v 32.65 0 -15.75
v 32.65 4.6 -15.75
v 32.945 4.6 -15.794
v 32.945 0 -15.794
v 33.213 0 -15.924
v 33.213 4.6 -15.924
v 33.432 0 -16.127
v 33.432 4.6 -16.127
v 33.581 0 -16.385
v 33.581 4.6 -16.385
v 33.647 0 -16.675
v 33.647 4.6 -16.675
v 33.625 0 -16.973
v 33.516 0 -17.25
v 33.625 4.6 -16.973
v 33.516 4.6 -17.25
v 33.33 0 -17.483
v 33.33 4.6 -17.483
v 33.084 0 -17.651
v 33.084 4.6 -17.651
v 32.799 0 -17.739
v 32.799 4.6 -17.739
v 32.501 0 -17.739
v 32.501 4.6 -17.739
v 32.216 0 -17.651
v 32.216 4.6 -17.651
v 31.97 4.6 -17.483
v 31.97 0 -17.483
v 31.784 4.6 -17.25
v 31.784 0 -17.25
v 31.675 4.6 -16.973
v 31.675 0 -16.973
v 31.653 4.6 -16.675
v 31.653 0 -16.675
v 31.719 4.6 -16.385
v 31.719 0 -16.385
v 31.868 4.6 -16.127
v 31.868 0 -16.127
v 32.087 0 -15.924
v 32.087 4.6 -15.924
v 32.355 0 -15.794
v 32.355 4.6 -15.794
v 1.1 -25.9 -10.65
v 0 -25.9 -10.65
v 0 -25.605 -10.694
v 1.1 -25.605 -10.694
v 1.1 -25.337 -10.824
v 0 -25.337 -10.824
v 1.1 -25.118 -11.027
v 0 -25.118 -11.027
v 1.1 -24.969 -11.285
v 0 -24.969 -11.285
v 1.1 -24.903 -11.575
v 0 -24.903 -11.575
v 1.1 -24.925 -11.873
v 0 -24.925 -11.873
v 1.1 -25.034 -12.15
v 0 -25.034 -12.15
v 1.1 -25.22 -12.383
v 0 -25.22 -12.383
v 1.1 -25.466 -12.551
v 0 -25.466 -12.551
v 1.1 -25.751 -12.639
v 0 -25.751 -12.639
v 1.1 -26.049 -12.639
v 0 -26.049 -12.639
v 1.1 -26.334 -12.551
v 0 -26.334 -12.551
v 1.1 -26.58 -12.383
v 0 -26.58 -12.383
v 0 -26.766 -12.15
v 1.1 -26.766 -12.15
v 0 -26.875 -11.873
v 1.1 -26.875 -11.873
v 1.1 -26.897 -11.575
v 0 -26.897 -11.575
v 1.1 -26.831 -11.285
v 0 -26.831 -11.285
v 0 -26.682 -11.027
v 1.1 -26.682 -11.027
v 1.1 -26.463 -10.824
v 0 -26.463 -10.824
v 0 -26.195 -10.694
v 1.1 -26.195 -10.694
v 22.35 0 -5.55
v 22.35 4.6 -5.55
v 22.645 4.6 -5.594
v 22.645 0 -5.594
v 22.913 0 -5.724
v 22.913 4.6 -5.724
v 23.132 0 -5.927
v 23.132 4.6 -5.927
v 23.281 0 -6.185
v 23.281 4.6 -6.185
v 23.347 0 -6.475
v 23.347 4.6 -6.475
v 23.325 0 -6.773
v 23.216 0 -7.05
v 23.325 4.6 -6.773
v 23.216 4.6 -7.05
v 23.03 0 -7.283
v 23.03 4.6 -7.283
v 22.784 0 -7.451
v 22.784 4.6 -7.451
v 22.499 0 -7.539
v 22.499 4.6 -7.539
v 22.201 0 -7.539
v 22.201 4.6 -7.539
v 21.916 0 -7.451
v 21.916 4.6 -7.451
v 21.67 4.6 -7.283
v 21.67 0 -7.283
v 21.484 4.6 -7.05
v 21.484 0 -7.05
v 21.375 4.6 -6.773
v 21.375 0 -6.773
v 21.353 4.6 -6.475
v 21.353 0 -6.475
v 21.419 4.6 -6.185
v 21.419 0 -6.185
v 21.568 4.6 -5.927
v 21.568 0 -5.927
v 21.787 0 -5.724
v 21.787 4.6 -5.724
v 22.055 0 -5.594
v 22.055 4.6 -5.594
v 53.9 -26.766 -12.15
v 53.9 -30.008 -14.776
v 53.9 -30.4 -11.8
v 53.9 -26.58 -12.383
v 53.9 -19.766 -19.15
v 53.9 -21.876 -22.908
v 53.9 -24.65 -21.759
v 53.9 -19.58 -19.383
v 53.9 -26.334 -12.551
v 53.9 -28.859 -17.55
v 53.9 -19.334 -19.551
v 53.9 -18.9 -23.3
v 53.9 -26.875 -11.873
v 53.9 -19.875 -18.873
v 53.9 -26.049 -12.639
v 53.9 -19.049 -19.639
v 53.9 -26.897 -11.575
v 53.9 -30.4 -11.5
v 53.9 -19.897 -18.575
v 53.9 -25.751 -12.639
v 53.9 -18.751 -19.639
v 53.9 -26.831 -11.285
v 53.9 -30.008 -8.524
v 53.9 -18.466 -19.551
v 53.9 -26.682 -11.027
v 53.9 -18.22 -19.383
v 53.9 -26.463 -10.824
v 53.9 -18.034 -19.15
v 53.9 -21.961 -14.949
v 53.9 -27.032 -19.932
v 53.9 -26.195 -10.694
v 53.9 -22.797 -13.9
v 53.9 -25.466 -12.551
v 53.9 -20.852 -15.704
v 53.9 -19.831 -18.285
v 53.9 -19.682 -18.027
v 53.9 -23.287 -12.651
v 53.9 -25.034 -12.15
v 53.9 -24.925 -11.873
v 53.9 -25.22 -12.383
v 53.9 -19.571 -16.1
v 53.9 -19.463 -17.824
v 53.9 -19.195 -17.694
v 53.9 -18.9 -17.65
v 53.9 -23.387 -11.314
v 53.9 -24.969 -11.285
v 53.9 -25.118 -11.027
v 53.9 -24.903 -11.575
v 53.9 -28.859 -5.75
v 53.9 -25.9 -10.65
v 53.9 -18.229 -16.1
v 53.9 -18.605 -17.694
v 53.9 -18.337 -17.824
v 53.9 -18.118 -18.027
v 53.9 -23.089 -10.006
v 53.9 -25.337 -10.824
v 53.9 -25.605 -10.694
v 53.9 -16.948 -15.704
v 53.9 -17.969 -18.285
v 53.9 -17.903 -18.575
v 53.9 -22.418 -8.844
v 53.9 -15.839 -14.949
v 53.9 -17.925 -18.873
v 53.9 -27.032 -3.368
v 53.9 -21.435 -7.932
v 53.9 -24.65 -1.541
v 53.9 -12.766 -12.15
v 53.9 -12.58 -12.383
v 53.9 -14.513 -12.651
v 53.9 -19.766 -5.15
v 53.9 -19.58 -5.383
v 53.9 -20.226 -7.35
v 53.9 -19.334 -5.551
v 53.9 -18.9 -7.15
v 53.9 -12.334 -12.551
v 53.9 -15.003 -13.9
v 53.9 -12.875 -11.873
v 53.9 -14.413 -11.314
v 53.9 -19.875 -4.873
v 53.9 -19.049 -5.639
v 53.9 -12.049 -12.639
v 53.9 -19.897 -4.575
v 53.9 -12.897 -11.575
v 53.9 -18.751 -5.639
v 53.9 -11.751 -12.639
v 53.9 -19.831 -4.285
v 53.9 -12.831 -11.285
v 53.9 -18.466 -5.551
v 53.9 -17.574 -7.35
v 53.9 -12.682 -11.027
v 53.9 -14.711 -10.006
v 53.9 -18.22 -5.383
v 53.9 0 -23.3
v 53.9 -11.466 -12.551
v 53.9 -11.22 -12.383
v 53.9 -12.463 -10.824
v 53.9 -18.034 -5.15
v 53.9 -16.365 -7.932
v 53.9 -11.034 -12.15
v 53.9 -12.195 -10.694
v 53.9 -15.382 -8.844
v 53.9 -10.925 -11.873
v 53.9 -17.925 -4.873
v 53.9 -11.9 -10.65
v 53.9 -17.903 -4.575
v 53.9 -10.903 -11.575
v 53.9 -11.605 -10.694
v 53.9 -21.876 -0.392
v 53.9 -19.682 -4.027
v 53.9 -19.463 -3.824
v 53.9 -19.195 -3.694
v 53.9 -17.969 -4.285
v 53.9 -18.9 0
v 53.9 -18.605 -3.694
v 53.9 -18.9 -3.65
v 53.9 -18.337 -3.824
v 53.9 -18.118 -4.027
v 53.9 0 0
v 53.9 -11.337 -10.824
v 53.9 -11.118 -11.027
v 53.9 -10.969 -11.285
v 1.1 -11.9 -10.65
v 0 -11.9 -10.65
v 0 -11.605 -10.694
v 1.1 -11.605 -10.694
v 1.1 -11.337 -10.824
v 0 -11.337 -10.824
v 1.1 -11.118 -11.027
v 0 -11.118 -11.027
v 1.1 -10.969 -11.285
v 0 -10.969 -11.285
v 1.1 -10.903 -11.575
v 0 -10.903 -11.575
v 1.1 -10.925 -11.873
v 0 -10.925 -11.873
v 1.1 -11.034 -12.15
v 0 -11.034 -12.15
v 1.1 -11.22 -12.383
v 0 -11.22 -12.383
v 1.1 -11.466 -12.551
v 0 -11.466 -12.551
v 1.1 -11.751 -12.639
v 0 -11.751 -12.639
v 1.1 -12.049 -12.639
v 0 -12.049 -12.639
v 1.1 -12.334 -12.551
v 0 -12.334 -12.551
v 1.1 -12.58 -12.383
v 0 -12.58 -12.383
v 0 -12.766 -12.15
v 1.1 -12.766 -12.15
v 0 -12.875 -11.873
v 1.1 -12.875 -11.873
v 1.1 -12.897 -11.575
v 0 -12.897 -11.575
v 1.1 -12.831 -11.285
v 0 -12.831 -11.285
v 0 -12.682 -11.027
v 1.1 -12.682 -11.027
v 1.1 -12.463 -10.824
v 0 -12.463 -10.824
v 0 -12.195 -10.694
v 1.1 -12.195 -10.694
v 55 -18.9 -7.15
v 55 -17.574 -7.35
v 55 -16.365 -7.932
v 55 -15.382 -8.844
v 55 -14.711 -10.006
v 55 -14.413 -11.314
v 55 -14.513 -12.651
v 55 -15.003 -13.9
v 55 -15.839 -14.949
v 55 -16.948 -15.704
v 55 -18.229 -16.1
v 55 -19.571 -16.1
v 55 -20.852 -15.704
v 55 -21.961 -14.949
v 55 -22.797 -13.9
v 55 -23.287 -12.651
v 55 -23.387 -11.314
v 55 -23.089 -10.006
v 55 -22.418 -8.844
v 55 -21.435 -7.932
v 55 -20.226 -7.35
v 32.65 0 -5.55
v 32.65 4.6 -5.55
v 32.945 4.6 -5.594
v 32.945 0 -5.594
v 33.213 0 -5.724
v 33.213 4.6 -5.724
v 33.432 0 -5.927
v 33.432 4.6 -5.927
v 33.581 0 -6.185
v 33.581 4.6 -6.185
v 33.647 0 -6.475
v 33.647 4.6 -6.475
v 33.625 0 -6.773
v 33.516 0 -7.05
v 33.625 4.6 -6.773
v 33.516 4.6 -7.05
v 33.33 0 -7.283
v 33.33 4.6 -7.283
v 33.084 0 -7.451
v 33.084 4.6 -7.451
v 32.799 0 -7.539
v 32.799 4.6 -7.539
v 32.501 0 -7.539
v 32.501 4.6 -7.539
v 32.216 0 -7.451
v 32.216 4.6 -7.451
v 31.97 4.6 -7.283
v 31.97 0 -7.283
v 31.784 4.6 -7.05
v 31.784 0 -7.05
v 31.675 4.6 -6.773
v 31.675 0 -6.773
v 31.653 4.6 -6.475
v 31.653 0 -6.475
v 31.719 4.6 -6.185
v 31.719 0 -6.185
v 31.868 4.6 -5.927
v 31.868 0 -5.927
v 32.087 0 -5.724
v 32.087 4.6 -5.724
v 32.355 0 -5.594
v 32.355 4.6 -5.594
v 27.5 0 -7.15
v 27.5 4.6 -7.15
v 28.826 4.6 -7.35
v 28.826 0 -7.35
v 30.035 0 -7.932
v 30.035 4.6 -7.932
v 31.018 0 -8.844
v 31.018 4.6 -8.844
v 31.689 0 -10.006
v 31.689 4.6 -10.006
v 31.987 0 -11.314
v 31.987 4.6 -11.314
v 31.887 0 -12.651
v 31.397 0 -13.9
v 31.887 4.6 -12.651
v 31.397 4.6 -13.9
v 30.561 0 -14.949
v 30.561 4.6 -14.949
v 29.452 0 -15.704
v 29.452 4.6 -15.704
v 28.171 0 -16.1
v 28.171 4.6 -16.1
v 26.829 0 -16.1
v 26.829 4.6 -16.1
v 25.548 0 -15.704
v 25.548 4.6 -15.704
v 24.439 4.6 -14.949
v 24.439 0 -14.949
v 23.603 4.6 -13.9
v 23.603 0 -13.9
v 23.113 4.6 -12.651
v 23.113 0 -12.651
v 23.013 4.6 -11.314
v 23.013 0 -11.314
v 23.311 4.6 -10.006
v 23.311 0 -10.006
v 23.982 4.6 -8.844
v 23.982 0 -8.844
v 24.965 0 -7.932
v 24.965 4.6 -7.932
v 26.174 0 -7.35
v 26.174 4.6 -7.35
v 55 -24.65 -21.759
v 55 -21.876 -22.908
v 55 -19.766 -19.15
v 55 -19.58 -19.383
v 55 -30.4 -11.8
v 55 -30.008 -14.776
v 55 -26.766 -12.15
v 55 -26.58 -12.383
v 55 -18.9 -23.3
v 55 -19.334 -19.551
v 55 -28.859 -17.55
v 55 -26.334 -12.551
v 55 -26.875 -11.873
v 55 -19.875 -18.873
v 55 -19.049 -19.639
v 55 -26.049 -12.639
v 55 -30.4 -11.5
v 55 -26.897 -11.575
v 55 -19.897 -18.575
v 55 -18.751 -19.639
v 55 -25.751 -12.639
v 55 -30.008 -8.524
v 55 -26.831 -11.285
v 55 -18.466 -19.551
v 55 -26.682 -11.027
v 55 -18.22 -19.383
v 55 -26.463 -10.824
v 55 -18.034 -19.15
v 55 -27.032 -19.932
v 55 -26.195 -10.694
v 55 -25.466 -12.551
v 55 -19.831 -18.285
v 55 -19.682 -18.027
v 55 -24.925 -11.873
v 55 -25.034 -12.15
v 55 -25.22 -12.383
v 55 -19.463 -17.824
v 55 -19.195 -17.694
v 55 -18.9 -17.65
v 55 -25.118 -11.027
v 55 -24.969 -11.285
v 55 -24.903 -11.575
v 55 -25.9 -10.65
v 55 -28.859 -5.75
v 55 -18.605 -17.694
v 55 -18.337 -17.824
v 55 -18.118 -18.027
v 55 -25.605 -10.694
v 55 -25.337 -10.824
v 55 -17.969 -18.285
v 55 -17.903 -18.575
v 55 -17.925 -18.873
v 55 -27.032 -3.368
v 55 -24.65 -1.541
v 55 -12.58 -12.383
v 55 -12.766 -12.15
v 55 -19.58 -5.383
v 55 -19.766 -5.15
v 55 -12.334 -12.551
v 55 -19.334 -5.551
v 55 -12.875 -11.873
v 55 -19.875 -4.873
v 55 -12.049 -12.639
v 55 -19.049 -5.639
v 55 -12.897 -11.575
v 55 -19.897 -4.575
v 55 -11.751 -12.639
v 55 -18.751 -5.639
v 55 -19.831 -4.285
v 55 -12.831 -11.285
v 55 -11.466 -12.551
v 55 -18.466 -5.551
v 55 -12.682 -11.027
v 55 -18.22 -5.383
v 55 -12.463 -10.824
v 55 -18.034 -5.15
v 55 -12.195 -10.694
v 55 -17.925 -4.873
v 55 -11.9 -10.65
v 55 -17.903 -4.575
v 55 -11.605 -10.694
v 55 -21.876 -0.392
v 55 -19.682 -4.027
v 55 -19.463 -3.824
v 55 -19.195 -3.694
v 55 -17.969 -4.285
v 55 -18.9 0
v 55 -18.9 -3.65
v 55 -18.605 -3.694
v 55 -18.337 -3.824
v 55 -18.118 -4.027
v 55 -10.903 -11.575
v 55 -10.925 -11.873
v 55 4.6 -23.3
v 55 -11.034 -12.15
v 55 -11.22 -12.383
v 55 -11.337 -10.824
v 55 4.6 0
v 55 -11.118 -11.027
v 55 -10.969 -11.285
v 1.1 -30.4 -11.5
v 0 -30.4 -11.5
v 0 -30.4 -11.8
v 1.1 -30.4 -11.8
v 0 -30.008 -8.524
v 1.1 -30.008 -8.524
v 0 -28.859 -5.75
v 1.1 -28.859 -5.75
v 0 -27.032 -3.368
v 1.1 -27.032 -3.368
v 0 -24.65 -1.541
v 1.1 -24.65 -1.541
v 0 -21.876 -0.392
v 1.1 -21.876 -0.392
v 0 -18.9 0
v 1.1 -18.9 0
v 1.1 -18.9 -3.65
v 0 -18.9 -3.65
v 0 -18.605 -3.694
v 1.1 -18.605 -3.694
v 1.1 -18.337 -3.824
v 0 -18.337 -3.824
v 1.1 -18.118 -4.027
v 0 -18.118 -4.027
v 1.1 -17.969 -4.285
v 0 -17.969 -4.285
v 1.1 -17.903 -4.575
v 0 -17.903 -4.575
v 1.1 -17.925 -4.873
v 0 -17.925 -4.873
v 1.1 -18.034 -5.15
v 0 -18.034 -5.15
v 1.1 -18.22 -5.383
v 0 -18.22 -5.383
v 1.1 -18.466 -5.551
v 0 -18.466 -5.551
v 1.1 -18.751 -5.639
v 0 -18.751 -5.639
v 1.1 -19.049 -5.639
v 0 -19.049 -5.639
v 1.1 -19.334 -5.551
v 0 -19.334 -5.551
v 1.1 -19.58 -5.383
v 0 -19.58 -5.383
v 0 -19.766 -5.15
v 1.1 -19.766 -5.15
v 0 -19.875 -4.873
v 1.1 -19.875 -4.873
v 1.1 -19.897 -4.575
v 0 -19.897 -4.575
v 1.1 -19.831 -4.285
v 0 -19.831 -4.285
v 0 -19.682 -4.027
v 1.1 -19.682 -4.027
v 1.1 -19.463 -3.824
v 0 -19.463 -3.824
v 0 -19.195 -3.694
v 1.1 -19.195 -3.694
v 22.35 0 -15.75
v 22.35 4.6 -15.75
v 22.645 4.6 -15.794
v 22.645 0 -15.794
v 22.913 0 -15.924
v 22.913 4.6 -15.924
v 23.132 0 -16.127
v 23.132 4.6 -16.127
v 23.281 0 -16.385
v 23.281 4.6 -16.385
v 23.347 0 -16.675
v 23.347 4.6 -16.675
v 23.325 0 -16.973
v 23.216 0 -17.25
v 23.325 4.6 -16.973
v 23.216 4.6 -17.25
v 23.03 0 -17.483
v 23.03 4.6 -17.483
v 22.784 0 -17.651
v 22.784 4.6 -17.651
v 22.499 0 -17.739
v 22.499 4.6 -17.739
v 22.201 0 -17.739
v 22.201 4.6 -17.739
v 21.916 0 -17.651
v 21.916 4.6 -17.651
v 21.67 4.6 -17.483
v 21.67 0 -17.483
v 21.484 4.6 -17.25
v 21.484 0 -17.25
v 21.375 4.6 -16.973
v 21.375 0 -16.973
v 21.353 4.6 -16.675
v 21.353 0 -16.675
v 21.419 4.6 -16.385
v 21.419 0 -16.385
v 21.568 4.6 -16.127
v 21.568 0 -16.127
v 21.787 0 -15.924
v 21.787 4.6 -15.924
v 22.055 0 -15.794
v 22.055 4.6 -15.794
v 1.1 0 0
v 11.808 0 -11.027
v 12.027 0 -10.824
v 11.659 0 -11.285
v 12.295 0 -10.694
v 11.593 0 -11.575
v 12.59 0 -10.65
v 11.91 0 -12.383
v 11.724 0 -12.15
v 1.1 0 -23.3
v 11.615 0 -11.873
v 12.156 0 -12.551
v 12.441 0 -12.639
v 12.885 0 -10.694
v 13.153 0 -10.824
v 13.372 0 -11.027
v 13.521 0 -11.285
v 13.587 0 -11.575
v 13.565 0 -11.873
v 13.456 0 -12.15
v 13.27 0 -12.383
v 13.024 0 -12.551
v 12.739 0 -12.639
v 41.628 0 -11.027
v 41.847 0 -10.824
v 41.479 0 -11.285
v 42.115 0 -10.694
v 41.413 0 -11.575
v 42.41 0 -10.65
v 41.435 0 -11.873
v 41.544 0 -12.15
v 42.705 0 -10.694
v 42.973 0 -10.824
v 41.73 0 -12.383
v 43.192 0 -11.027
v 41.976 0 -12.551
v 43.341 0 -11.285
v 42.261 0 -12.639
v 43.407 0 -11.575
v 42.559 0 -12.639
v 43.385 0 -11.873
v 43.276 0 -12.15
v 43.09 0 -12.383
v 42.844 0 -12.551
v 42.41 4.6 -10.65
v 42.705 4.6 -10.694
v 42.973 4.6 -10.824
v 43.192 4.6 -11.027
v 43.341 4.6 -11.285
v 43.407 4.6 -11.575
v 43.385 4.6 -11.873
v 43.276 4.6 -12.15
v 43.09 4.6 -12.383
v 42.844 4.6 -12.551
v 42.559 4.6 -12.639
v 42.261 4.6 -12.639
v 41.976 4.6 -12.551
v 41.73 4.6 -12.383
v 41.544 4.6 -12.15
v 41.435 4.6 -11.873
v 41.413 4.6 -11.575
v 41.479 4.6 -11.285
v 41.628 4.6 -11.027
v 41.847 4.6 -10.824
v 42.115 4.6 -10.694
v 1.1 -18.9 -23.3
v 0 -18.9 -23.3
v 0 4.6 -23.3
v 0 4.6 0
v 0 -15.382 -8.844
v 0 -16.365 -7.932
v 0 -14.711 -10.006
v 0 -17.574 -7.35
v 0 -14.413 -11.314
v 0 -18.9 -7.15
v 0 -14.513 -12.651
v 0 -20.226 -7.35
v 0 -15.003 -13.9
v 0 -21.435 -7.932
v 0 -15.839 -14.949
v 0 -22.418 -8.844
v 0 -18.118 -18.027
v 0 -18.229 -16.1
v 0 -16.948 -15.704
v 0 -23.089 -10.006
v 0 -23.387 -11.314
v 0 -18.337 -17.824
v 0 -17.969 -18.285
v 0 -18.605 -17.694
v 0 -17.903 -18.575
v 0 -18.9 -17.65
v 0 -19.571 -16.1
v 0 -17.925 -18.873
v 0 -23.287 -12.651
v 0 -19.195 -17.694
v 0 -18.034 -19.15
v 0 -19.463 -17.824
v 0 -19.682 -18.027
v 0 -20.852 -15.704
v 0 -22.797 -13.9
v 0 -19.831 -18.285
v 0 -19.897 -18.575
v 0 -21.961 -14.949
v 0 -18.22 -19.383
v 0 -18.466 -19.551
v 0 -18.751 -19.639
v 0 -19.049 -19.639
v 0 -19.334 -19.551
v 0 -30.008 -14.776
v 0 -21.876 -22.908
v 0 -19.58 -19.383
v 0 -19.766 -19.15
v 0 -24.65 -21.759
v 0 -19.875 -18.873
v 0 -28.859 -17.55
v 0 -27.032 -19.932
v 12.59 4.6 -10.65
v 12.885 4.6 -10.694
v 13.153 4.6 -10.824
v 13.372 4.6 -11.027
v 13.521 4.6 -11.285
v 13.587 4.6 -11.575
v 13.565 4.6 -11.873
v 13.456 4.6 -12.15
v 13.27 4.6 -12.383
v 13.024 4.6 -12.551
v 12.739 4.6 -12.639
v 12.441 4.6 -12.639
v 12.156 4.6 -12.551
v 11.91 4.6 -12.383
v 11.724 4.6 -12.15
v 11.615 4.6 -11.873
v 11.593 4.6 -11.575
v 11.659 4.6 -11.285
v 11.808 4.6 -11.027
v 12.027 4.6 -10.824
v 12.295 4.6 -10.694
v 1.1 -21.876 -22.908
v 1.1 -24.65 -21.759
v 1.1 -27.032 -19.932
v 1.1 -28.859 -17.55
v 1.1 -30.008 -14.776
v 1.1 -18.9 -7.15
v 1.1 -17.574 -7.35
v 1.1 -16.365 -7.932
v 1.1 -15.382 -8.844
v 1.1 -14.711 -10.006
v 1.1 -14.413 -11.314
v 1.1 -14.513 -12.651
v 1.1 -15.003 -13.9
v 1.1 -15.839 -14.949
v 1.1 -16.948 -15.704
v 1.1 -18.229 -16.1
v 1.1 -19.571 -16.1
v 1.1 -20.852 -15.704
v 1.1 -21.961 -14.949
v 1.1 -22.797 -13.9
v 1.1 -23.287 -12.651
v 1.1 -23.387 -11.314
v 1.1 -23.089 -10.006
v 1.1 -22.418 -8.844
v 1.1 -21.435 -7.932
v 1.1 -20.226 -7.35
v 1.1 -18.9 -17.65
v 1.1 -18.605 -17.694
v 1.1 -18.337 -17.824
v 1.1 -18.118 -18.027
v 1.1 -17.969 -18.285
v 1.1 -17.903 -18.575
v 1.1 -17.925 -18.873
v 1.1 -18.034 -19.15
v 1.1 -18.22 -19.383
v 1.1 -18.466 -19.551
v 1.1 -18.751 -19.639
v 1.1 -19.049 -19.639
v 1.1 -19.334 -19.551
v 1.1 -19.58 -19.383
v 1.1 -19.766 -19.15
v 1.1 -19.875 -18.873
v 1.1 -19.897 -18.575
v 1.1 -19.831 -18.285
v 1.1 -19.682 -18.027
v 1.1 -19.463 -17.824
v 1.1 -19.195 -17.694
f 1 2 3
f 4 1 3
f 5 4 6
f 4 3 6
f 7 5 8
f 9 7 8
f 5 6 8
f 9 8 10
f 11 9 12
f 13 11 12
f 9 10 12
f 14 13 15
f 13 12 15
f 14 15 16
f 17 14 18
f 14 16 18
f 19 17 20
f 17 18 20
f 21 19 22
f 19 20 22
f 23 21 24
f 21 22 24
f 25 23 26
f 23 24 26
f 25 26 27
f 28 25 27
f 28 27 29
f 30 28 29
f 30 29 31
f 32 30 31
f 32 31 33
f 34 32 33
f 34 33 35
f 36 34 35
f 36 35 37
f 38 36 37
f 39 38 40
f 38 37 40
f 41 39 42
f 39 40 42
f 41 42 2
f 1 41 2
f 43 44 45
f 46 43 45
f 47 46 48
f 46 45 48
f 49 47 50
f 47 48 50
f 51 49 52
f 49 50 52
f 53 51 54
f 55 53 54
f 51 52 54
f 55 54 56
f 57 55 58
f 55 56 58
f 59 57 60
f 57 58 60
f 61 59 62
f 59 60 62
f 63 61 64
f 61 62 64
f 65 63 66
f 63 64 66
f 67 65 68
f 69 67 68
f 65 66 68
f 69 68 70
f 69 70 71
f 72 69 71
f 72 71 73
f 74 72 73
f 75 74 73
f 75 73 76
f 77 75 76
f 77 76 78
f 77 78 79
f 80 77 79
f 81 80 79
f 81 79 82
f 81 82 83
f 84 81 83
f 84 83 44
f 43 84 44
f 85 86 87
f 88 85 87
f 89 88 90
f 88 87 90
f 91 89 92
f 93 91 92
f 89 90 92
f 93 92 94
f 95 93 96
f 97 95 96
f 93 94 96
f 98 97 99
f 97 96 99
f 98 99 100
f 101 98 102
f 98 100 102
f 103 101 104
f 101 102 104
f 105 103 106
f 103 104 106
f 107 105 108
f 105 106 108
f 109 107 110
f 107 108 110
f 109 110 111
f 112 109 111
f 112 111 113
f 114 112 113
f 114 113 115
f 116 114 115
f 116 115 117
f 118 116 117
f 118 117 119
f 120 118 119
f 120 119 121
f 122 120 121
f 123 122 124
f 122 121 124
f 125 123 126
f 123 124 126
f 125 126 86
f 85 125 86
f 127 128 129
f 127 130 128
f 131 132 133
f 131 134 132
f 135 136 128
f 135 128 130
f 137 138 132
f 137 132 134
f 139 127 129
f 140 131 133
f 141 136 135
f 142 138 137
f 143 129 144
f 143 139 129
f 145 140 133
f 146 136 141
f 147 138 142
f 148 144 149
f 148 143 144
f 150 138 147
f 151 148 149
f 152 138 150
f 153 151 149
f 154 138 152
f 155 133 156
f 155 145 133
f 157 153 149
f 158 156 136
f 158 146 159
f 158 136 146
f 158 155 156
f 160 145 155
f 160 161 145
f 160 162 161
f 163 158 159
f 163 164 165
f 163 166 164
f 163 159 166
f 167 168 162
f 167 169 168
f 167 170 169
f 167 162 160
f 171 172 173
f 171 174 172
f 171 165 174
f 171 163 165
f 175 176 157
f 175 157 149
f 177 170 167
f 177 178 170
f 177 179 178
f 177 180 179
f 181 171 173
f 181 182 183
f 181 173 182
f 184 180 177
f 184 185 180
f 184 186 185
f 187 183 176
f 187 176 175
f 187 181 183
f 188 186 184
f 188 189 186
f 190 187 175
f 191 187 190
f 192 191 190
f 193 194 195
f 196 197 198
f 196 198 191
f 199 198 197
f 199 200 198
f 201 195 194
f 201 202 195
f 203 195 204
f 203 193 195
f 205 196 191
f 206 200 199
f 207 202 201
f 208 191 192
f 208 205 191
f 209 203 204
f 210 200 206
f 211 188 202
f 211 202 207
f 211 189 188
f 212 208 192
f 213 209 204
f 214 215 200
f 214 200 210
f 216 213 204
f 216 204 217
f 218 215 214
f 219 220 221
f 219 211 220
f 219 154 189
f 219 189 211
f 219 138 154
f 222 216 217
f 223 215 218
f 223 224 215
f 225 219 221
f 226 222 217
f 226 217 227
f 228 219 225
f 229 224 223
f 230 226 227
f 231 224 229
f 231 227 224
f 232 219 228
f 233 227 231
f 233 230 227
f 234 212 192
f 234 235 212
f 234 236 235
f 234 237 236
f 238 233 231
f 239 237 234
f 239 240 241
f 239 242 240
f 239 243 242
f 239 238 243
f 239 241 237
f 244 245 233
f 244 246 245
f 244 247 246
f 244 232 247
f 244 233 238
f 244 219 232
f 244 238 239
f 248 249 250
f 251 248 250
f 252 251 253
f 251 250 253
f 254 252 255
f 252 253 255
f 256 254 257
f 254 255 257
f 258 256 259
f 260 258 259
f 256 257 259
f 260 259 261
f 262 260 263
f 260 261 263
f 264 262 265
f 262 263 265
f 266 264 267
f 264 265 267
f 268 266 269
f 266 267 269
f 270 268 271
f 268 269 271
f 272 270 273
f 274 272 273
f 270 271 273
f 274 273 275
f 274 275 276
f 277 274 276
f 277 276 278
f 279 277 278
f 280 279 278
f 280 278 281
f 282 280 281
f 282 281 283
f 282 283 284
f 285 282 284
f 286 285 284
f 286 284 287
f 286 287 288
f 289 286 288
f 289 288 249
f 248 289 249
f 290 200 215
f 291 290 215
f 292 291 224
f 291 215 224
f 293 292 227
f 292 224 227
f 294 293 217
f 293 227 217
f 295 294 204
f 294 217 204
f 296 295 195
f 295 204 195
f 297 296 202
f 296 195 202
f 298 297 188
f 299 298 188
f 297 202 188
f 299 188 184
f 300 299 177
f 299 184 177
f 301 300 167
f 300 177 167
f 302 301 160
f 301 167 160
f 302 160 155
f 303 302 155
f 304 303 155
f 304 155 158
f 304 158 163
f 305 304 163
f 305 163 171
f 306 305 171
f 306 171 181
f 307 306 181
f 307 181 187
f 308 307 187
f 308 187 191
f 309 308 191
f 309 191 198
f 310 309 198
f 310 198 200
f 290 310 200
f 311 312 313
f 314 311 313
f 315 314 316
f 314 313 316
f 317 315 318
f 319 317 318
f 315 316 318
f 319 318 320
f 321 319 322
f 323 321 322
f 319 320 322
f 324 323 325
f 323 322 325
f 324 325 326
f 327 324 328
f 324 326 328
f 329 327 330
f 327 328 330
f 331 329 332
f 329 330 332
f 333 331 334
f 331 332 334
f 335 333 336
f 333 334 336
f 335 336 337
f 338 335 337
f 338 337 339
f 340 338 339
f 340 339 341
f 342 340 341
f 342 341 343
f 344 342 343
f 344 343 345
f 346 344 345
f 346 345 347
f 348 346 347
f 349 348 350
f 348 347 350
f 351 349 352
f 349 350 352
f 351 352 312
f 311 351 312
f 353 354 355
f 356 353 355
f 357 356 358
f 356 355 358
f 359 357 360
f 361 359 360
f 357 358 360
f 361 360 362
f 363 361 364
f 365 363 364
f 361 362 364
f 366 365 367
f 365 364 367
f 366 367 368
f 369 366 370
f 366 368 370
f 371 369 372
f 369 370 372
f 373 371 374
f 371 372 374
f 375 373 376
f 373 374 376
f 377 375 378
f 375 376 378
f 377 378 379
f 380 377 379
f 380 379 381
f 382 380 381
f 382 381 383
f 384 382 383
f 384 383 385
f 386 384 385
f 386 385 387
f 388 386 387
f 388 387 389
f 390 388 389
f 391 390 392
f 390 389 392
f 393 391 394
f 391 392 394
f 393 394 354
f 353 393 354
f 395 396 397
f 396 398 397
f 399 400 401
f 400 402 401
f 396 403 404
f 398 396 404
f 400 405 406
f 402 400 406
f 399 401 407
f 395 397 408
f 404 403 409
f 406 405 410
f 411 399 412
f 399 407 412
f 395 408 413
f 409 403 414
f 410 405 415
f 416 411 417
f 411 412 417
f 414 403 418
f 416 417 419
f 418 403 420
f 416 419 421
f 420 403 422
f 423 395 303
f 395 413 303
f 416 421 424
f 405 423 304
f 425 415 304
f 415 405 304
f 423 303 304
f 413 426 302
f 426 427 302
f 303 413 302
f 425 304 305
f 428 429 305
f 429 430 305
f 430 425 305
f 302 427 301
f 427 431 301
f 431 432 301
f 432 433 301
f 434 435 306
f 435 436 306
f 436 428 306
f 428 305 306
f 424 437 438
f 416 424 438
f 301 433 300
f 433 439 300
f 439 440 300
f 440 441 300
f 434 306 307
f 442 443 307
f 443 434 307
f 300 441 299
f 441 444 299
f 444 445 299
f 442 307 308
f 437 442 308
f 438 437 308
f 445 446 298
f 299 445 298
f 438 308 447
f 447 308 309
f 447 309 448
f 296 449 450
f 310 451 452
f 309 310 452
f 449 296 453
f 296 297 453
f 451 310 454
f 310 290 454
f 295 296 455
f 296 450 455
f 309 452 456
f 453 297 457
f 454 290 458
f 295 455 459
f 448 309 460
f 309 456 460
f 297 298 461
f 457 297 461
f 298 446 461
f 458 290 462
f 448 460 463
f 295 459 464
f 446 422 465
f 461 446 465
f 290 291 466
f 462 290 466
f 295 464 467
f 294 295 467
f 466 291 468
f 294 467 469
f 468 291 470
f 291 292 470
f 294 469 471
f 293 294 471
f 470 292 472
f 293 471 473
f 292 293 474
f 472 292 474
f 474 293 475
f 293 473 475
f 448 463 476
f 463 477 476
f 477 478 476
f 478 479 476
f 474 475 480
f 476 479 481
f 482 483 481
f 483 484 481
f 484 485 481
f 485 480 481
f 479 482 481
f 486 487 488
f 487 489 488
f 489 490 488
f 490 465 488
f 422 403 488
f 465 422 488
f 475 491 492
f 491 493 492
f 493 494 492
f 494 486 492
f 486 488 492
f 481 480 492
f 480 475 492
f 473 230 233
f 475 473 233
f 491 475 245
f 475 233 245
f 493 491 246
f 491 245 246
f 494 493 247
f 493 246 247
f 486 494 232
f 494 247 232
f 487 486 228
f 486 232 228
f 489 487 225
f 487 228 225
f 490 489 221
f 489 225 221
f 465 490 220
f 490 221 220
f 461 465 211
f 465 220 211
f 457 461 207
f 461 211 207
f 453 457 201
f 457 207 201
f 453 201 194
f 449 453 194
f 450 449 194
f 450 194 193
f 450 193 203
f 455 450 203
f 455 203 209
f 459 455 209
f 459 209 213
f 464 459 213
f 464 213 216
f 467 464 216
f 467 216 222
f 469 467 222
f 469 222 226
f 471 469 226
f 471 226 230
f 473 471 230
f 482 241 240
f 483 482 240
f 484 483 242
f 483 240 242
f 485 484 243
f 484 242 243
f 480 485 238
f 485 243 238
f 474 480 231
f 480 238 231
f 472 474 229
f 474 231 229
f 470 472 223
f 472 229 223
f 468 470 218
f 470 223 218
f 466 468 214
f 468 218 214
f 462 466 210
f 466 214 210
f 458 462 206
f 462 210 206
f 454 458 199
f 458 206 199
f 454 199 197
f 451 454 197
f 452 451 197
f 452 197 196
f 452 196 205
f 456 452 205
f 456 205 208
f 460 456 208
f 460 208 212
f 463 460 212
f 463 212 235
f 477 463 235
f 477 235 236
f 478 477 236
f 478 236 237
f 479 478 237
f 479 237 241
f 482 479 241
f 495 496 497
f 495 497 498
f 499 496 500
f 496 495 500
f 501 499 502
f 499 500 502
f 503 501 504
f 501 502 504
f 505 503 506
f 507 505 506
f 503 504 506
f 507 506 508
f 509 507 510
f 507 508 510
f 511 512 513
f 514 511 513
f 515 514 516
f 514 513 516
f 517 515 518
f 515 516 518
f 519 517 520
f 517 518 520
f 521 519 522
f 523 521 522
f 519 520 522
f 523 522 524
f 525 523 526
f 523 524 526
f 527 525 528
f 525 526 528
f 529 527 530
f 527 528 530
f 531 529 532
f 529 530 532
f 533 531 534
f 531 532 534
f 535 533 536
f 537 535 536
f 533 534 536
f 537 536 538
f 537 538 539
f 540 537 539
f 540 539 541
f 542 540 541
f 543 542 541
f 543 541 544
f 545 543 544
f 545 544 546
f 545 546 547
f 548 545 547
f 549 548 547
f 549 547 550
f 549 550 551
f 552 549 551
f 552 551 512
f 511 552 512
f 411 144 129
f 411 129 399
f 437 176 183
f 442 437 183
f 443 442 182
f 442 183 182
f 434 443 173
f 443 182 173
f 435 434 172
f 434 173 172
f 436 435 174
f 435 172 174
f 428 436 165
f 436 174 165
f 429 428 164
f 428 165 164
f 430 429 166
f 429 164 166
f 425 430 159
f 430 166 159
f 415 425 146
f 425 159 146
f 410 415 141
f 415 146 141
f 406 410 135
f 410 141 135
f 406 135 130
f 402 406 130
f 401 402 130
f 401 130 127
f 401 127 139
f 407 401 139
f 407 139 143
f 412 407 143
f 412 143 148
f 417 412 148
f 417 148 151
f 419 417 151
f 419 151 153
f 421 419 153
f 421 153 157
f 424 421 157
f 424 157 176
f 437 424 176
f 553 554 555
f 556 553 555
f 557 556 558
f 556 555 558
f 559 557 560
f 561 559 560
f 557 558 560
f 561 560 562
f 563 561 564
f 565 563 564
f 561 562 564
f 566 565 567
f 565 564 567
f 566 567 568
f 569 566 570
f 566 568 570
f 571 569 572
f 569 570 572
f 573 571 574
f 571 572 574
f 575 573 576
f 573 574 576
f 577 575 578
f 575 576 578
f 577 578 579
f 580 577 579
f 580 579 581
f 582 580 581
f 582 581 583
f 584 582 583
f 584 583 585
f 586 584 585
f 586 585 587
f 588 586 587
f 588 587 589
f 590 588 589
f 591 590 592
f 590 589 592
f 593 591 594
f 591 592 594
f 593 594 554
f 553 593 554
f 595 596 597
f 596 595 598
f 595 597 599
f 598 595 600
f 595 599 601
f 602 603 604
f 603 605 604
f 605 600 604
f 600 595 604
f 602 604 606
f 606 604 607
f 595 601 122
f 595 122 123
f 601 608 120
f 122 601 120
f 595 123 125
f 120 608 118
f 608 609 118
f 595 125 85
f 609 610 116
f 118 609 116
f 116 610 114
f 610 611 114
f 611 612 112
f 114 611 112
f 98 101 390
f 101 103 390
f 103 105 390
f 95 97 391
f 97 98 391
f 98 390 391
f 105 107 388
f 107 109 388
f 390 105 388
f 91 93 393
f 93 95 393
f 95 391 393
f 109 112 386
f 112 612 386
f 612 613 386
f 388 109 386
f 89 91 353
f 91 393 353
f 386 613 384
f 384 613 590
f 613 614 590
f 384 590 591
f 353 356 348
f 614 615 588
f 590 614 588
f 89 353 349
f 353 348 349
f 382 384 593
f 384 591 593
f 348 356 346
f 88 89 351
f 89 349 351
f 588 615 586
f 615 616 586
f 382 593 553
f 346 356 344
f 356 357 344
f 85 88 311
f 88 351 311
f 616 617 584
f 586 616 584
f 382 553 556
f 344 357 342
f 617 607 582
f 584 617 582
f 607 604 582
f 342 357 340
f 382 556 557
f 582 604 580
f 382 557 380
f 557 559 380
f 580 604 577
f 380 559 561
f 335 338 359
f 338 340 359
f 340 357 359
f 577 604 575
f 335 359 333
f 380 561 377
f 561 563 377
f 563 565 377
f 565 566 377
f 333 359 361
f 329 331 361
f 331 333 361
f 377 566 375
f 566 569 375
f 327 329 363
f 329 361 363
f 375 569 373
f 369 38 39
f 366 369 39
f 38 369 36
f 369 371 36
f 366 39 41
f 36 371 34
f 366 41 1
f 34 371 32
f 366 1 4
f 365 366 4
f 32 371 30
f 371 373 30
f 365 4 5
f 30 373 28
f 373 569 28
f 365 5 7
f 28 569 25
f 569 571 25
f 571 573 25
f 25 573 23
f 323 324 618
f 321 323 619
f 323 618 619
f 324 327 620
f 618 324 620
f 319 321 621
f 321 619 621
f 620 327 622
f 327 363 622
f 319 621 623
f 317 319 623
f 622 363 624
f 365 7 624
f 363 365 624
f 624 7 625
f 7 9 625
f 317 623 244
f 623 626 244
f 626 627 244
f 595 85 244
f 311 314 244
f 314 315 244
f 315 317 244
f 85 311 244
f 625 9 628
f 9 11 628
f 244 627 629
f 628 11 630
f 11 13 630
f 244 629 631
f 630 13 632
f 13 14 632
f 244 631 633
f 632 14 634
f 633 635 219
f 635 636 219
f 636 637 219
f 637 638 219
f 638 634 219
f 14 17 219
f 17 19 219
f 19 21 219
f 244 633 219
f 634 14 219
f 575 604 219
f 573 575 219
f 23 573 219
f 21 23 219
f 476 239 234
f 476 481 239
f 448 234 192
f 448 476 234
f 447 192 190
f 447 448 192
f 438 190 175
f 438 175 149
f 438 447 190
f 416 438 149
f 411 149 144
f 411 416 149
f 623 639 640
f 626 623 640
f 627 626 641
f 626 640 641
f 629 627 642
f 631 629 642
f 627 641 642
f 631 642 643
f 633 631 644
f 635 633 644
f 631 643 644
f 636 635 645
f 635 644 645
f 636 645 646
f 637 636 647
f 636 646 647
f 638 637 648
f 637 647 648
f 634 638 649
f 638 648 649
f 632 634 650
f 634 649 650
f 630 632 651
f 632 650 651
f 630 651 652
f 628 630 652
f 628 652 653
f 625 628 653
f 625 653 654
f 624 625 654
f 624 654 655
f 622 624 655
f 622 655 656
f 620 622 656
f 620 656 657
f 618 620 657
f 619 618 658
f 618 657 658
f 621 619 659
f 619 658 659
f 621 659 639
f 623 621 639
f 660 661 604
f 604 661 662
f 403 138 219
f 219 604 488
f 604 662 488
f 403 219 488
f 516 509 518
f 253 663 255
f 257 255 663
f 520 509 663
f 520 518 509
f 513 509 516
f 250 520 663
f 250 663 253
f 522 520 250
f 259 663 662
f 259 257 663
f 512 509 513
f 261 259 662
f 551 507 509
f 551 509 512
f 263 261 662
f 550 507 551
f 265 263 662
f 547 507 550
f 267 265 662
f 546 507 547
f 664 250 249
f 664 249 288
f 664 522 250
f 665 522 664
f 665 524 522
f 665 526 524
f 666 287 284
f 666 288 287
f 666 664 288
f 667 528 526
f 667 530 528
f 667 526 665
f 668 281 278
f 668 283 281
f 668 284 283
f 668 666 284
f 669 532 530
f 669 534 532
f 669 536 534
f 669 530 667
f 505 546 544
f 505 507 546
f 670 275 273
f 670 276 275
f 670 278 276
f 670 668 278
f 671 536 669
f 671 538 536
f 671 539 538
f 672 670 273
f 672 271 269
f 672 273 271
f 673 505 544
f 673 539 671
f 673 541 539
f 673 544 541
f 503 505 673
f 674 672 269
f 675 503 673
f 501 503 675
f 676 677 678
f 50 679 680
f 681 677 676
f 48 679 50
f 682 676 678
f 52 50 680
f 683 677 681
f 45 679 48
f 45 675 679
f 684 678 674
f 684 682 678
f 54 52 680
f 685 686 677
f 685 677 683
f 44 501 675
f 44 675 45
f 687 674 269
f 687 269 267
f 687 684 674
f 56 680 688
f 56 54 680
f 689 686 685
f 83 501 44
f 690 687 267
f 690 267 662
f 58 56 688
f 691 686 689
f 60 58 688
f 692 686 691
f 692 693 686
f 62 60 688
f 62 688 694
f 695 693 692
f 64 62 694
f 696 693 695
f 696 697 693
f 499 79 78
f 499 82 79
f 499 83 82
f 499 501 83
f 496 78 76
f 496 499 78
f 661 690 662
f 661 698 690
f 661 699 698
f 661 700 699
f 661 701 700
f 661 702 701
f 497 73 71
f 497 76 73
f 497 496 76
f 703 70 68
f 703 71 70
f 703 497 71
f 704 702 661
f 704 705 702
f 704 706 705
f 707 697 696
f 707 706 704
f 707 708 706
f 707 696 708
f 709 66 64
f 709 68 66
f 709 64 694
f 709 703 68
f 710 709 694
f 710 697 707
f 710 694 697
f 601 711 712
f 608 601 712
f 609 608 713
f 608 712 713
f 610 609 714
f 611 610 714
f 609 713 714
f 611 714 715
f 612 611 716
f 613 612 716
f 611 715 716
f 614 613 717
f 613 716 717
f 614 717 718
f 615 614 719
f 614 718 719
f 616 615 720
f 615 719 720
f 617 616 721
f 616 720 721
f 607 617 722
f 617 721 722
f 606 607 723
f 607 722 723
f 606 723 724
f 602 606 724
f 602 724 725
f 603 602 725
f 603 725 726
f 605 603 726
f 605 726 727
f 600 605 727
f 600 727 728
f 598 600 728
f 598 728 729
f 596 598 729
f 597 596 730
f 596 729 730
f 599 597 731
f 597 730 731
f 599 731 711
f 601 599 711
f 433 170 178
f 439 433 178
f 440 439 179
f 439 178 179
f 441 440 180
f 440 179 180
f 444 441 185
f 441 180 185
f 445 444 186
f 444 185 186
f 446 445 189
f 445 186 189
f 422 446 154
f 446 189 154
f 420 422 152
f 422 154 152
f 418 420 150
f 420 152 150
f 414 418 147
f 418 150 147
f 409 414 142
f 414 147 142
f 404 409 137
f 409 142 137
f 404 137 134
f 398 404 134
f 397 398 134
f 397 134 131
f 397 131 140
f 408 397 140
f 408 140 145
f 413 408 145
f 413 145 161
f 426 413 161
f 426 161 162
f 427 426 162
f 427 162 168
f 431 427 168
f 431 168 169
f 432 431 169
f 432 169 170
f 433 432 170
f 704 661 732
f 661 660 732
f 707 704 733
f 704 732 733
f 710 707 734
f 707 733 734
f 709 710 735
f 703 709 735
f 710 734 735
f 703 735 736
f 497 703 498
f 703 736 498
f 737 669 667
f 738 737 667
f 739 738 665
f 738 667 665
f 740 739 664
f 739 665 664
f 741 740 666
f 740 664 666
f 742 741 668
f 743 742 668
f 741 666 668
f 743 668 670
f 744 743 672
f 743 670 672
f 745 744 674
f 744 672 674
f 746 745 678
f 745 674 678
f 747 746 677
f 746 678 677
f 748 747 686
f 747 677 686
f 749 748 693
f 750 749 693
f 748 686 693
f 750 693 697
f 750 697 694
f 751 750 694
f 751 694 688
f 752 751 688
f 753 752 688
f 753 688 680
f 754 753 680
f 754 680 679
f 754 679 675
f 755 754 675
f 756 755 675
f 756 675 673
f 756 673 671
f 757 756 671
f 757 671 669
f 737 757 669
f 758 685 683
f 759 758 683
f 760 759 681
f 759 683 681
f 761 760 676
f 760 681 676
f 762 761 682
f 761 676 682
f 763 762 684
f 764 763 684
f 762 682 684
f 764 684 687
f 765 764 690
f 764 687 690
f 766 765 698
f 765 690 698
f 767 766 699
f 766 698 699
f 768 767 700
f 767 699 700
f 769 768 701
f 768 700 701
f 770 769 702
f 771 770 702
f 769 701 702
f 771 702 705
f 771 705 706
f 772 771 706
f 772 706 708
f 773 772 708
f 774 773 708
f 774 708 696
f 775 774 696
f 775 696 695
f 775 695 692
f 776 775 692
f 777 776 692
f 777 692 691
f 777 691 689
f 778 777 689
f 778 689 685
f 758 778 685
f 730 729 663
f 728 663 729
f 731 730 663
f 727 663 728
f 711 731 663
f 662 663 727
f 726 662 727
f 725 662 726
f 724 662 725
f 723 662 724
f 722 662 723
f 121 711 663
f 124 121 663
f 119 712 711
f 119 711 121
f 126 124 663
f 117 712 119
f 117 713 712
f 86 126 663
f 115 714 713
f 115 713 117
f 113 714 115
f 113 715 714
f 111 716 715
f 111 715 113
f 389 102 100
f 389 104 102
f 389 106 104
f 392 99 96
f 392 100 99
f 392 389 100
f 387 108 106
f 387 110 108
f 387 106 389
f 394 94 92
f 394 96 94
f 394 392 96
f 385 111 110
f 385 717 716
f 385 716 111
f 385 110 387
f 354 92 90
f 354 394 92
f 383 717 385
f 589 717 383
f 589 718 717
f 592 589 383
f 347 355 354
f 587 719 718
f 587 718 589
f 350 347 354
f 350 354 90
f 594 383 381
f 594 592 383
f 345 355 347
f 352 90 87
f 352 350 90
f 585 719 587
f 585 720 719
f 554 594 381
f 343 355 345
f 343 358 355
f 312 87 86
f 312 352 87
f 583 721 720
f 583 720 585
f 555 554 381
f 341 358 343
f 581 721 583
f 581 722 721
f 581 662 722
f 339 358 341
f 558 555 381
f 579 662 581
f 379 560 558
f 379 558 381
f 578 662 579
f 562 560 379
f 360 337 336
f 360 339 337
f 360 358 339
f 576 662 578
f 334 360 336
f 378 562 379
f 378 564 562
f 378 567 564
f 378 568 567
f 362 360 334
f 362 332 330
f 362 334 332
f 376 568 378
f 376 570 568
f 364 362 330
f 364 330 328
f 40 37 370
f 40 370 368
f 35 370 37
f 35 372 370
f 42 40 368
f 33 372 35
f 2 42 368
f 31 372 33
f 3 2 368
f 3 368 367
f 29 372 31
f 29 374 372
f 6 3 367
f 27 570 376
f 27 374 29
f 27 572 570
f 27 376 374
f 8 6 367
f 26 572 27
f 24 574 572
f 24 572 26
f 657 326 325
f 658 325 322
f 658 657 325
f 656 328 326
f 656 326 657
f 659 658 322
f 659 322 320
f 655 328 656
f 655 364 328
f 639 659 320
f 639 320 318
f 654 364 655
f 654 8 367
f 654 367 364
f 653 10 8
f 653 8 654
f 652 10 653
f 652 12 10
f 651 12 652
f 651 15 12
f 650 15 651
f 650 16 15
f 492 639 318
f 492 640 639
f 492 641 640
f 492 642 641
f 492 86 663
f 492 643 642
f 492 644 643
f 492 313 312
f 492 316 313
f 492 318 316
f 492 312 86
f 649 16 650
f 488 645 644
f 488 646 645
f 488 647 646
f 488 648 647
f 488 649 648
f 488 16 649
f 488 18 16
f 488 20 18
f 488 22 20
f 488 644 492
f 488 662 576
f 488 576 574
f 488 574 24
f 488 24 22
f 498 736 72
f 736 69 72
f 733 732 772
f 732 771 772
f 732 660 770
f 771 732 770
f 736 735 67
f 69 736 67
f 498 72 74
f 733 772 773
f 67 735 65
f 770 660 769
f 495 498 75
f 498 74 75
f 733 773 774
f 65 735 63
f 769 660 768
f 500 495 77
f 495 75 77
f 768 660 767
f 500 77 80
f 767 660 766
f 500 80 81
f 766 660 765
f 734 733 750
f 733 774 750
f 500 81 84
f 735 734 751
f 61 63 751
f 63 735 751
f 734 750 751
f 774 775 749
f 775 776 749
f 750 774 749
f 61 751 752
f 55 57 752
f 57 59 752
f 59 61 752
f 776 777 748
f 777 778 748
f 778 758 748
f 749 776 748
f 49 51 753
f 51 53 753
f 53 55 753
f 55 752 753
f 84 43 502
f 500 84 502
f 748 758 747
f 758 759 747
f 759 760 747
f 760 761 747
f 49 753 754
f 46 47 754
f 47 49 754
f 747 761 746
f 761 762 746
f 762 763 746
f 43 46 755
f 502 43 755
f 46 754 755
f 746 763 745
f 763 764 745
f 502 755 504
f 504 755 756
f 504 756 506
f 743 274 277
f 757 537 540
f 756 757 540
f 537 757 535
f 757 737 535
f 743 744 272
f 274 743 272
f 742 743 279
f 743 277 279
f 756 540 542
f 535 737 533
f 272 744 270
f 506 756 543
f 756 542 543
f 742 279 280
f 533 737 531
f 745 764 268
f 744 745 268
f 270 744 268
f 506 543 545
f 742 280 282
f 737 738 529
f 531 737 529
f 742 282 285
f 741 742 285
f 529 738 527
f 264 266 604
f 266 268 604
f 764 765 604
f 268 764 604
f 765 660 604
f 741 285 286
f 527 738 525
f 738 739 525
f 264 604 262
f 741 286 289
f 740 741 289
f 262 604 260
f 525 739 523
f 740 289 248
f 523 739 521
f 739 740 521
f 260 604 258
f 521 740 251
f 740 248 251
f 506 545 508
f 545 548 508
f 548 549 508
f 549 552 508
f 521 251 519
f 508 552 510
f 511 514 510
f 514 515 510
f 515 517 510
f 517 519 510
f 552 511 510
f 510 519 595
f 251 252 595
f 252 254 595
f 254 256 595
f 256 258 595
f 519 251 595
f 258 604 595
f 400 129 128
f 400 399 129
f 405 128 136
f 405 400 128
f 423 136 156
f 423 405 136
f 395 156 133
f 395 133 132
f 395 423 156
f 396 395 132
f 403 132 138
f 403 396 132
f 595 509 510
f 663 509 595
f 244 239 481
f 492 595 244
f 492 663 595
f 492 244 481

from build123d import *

# Parameters (mm, degrees)
SKETCH1_W                = 55
SKETCH1_H                = 23.3
MOUNTPLATE_DEPTH         = 4.6
SKETCH3_R                = 4.5
AXLEHOLE_MOUNT_DEPTH     = 4.6
SKETCH2_R                = 1
MOUNTHOLES_DEPTH         = 4.6
SKETCH4_W                = 1.1
SKETCH4_H                = 23.3
SERVOLEGS_DEPTH          = 30.4
CENTERHOLES_REACH        = 69.023
SKETCH5_R                = 4.5
ROTATOR_MOUNTHOLES_REACH = 69.023
SKETCH6_R                = 1
FILLET1_R                = 11.5
FILLET2_R                = 11.5
FILLET3_R                = 11.5
FILLET4_R                = 11.5


with BuildPart() as part:
    # Sketch1 → MountPlate (new body)
    with BuildSketch(Plane(origin=(0, 0, 0), x_dir=(1, 0, 0), z_dir=(0, 1, 0))):
        with Locations((27.5, 11.65)):
            Rectangle(SKETCH1_W, SKETCH1_H)
    extrude(amount=MOUNTPLATE_DEPTH)

    # Sketch3 → AxleHole-Mount (cut)
    with BuildSketch(Plane(origin=(0, 4.6, 0), x_dir=(1, 0, 0), z_dir=(0, 1, 0))):
        with Locations(Location((27.5, 11.65, 0), (0, 0, 270))):
            Circle(SKETCH3_R)
    extrude(amount=-AXLEHOLE_MOUNT_DEPTH, mode=Mode.SUBTRACT)

    # Sketch2 → MountHoles (cut)
    with BuildSketch(Plane(origin=(0, 4.6, 0), x_dir=(1, 0, 0), z_dir=(0, 1, 0))):
        with Locations(Location((22.35, 16.75, 0), (0, 0, 270))):
            Circle(SKETCH2_R)
        with Locations(Location((12.59, 11.65, 0), (0, 0, 270))):
            Circle(SKETCH2_R)
        with Locations(Location((32.65, 16.75, 0), (0, 0, 270))):
            Circle(SKETCH2_R)
        with Locations(Location((22.35, 6.55, 0), (0, 0, 270))):
            Circle(SKETCH2_R)
        with Locations(Location((42.41, 11.65, 0), (0, 0, 270))):
            Circle(SKETCH2_R)
        with Locations(Location((32.65, 6.55, 0), (0, 0, 270))):
            Circle(SKETCH2_R)
    extrude(amount=-MOUNTHOLES_DEPTH, mode=Mode.SUBTRACT)

    # Sketch4 → ServoLegs (add)
    with BuildSketch(Plane.XZ):
        with Locations((54.45, -11.65)):
            Rectangle(SKETCH4_W, SKETCH4_H)
        with Locations((0.55, -11.65)):
            Rectangle(SKETCH4_W, SKETCH4_H)
    extrude(amount=SERVOLEGS_DEPTH)

    # CenterHoles: up to this face of the body (flat: up to its plane)
    centerholes_end = Plane(part.part.faces().sort_by_distance((55, -12.9, -11.65))[0])
    # Sketch5 → CenterHoles (cut, up to the picked face)
    with BuildSketch(Plane.ZY, mode=Mode.PRIVATE) as centerholes_sk1:
        with Locations((-11.65, -18.9)):
            Circle(SKETCH5_R)
    centerholes_tool1 = split(extrude(centerholes_sk1.sketch, amount=-CENTERHOLES_REACH, mode=Mode.PRIVATE), bisect_by=centerholes_end, keep=Keep.BOTH, mode=Mode.PRIVATE)
    add(centerholes_tool1.solids().sort_by(Axis((0, -18.9, -11.65), (1, 0, 0)))[0], mode=Mode.SUBTRACT)

    # Rotator-MountHoles: up to this face of the body (flat: up to its plane)
    rotator_mountholes_end = Plane(part.part.faces().sort_by_distance((55, -12.392336394, -11.65))[0])
    # Sketch6 → Rotator-MountHoles (cut, up to the picked face)
    with BuildSketch(Plane.ZY, mode=Mode.PRIVATE) as rotator_mountholes_sk1:
        with Locations((-11.65, -25.9)):
            Circle(SKETCH6_R)
    rotator_mountholes_tool1 = split(extrude(rotator_mountholes_sk1.sketch, amount=-ROTATOR_MOUNTHOLES_REACH, mode=Mode.PRIVATE), bisect_by=rotator_mountholes_end, keep=Keep.BOTH, mode=Mode.PRIVATE)
    # Sketch6 → Rotator-MountHoles (cut, up to the picked face)
    with BuildSketch(Plane.ZY, mode=Mode.PRIVATE) as rotator_mountholes_sk2:
        with Locations((-18.65, -18.9)):
            Circle(SKETCH6_R)
    rotator_mountholes_tool2 = split(extrude(rotator_mountholes_sk2.sketch, amount=-ROTATOR_MOUNTHOLES_REACH, mode=Mode.PRIVATE), bisect_by=rotator_mountholes_end, keep=Keep.BOTH, mode=Mode.PRIVATE)
    # Sketch6 → Rotator-MountHoles (cut, up to the picked face)
    with BuildSketch(Plane.ZY, mode=Mode.PRIVATE) as rotator_mountholes_sk3:
        with Locations((-11.65, -11.9)):
            Circle(SKETCH6_R)
    rotator_mountholes_tool3 = split(extrude(rotator_mountholes_sk3.sketch, amount=-ROTATOR_MOUNTHOLES_REACH, mode=Mode.PRIVATE), bisect_by=rotator_mountholes_end, keep=Keep.BOTH, mode=Mode.PRIVATE)
    # Sketch6 → Rotator-MountHoles (cut, up to the picked face)
    with BuildSketch(Plane.ZY, mode=Mode.PRIVATE) as rotator_mountholes_sk4:
        with Locations((-4.65, -18.9)):
            Circle(SKETCH6_R)
    rotator_mountholes_tool4 = split(extrude(rotator_mountholes_sk4.sketch, amount=-ROTATOR_MOUNTHOLES_REACH, mode=Mode.PRIVATE), bisect_by=rotator_mountholes_end, keep=Keep.BOTH, mode=Mode.PRIVATE)
    add(rotator_mountholes_tool1.solids().sort_by(Axis((0, -25.9, -11.65), (1, 0, 0)))[0], mode=Mode.SUBTRACT)
    add(rotator_mountholes_tool2.solids().sort_by(Axis((0, -18.9, -18.65), (1, 0, 0)))[0], mode=Mode.SUBTRACT)
    add(rotator_mountholes_tool3.solids().sort_by(Axis((0, -11.9, -11.65), (1, 0, 0)))[0], mode=Mode.SUBTRACT)
    add(rotator_mountholes_tool4.solids().sort_by(Axis((0, -18.9, -4.65), (1, 0, 0)))[0], mode=Mode.SUBTRACT)

    # Fillet1
    fillet1_edges = [part.edges().sort_by_distance(p)[0] for p in [
        (0.55, -30.4, -23.3),
    ]]
    fillet(fillet1_edges, radius=FILLET1_R)

    # Fillet2
    fillet2_edges = [part.edges().sort_by_distance(p)[0] for p in [
        (0.55, -30.4, 0),
    ]]
    fillet(fillet2_edges, radius=FILLET2_R)

    # Fillet3
    fillet3_edges = [part.edges().sort_by_distance(p)[0] for p in [
        (54.45, -30.4, 0),
    ]]
    fillet(fillet3_edges, radius=FILLET3_R)

    # Fillet4
    fillet4_edges = [part.edges().sort_by_distance(p)[0] for p in [
        (54.45, -30.4, -23.3),
    ]]
    fillet(fillet4_edges, radius=FILLET4_R)


solid = part.part
